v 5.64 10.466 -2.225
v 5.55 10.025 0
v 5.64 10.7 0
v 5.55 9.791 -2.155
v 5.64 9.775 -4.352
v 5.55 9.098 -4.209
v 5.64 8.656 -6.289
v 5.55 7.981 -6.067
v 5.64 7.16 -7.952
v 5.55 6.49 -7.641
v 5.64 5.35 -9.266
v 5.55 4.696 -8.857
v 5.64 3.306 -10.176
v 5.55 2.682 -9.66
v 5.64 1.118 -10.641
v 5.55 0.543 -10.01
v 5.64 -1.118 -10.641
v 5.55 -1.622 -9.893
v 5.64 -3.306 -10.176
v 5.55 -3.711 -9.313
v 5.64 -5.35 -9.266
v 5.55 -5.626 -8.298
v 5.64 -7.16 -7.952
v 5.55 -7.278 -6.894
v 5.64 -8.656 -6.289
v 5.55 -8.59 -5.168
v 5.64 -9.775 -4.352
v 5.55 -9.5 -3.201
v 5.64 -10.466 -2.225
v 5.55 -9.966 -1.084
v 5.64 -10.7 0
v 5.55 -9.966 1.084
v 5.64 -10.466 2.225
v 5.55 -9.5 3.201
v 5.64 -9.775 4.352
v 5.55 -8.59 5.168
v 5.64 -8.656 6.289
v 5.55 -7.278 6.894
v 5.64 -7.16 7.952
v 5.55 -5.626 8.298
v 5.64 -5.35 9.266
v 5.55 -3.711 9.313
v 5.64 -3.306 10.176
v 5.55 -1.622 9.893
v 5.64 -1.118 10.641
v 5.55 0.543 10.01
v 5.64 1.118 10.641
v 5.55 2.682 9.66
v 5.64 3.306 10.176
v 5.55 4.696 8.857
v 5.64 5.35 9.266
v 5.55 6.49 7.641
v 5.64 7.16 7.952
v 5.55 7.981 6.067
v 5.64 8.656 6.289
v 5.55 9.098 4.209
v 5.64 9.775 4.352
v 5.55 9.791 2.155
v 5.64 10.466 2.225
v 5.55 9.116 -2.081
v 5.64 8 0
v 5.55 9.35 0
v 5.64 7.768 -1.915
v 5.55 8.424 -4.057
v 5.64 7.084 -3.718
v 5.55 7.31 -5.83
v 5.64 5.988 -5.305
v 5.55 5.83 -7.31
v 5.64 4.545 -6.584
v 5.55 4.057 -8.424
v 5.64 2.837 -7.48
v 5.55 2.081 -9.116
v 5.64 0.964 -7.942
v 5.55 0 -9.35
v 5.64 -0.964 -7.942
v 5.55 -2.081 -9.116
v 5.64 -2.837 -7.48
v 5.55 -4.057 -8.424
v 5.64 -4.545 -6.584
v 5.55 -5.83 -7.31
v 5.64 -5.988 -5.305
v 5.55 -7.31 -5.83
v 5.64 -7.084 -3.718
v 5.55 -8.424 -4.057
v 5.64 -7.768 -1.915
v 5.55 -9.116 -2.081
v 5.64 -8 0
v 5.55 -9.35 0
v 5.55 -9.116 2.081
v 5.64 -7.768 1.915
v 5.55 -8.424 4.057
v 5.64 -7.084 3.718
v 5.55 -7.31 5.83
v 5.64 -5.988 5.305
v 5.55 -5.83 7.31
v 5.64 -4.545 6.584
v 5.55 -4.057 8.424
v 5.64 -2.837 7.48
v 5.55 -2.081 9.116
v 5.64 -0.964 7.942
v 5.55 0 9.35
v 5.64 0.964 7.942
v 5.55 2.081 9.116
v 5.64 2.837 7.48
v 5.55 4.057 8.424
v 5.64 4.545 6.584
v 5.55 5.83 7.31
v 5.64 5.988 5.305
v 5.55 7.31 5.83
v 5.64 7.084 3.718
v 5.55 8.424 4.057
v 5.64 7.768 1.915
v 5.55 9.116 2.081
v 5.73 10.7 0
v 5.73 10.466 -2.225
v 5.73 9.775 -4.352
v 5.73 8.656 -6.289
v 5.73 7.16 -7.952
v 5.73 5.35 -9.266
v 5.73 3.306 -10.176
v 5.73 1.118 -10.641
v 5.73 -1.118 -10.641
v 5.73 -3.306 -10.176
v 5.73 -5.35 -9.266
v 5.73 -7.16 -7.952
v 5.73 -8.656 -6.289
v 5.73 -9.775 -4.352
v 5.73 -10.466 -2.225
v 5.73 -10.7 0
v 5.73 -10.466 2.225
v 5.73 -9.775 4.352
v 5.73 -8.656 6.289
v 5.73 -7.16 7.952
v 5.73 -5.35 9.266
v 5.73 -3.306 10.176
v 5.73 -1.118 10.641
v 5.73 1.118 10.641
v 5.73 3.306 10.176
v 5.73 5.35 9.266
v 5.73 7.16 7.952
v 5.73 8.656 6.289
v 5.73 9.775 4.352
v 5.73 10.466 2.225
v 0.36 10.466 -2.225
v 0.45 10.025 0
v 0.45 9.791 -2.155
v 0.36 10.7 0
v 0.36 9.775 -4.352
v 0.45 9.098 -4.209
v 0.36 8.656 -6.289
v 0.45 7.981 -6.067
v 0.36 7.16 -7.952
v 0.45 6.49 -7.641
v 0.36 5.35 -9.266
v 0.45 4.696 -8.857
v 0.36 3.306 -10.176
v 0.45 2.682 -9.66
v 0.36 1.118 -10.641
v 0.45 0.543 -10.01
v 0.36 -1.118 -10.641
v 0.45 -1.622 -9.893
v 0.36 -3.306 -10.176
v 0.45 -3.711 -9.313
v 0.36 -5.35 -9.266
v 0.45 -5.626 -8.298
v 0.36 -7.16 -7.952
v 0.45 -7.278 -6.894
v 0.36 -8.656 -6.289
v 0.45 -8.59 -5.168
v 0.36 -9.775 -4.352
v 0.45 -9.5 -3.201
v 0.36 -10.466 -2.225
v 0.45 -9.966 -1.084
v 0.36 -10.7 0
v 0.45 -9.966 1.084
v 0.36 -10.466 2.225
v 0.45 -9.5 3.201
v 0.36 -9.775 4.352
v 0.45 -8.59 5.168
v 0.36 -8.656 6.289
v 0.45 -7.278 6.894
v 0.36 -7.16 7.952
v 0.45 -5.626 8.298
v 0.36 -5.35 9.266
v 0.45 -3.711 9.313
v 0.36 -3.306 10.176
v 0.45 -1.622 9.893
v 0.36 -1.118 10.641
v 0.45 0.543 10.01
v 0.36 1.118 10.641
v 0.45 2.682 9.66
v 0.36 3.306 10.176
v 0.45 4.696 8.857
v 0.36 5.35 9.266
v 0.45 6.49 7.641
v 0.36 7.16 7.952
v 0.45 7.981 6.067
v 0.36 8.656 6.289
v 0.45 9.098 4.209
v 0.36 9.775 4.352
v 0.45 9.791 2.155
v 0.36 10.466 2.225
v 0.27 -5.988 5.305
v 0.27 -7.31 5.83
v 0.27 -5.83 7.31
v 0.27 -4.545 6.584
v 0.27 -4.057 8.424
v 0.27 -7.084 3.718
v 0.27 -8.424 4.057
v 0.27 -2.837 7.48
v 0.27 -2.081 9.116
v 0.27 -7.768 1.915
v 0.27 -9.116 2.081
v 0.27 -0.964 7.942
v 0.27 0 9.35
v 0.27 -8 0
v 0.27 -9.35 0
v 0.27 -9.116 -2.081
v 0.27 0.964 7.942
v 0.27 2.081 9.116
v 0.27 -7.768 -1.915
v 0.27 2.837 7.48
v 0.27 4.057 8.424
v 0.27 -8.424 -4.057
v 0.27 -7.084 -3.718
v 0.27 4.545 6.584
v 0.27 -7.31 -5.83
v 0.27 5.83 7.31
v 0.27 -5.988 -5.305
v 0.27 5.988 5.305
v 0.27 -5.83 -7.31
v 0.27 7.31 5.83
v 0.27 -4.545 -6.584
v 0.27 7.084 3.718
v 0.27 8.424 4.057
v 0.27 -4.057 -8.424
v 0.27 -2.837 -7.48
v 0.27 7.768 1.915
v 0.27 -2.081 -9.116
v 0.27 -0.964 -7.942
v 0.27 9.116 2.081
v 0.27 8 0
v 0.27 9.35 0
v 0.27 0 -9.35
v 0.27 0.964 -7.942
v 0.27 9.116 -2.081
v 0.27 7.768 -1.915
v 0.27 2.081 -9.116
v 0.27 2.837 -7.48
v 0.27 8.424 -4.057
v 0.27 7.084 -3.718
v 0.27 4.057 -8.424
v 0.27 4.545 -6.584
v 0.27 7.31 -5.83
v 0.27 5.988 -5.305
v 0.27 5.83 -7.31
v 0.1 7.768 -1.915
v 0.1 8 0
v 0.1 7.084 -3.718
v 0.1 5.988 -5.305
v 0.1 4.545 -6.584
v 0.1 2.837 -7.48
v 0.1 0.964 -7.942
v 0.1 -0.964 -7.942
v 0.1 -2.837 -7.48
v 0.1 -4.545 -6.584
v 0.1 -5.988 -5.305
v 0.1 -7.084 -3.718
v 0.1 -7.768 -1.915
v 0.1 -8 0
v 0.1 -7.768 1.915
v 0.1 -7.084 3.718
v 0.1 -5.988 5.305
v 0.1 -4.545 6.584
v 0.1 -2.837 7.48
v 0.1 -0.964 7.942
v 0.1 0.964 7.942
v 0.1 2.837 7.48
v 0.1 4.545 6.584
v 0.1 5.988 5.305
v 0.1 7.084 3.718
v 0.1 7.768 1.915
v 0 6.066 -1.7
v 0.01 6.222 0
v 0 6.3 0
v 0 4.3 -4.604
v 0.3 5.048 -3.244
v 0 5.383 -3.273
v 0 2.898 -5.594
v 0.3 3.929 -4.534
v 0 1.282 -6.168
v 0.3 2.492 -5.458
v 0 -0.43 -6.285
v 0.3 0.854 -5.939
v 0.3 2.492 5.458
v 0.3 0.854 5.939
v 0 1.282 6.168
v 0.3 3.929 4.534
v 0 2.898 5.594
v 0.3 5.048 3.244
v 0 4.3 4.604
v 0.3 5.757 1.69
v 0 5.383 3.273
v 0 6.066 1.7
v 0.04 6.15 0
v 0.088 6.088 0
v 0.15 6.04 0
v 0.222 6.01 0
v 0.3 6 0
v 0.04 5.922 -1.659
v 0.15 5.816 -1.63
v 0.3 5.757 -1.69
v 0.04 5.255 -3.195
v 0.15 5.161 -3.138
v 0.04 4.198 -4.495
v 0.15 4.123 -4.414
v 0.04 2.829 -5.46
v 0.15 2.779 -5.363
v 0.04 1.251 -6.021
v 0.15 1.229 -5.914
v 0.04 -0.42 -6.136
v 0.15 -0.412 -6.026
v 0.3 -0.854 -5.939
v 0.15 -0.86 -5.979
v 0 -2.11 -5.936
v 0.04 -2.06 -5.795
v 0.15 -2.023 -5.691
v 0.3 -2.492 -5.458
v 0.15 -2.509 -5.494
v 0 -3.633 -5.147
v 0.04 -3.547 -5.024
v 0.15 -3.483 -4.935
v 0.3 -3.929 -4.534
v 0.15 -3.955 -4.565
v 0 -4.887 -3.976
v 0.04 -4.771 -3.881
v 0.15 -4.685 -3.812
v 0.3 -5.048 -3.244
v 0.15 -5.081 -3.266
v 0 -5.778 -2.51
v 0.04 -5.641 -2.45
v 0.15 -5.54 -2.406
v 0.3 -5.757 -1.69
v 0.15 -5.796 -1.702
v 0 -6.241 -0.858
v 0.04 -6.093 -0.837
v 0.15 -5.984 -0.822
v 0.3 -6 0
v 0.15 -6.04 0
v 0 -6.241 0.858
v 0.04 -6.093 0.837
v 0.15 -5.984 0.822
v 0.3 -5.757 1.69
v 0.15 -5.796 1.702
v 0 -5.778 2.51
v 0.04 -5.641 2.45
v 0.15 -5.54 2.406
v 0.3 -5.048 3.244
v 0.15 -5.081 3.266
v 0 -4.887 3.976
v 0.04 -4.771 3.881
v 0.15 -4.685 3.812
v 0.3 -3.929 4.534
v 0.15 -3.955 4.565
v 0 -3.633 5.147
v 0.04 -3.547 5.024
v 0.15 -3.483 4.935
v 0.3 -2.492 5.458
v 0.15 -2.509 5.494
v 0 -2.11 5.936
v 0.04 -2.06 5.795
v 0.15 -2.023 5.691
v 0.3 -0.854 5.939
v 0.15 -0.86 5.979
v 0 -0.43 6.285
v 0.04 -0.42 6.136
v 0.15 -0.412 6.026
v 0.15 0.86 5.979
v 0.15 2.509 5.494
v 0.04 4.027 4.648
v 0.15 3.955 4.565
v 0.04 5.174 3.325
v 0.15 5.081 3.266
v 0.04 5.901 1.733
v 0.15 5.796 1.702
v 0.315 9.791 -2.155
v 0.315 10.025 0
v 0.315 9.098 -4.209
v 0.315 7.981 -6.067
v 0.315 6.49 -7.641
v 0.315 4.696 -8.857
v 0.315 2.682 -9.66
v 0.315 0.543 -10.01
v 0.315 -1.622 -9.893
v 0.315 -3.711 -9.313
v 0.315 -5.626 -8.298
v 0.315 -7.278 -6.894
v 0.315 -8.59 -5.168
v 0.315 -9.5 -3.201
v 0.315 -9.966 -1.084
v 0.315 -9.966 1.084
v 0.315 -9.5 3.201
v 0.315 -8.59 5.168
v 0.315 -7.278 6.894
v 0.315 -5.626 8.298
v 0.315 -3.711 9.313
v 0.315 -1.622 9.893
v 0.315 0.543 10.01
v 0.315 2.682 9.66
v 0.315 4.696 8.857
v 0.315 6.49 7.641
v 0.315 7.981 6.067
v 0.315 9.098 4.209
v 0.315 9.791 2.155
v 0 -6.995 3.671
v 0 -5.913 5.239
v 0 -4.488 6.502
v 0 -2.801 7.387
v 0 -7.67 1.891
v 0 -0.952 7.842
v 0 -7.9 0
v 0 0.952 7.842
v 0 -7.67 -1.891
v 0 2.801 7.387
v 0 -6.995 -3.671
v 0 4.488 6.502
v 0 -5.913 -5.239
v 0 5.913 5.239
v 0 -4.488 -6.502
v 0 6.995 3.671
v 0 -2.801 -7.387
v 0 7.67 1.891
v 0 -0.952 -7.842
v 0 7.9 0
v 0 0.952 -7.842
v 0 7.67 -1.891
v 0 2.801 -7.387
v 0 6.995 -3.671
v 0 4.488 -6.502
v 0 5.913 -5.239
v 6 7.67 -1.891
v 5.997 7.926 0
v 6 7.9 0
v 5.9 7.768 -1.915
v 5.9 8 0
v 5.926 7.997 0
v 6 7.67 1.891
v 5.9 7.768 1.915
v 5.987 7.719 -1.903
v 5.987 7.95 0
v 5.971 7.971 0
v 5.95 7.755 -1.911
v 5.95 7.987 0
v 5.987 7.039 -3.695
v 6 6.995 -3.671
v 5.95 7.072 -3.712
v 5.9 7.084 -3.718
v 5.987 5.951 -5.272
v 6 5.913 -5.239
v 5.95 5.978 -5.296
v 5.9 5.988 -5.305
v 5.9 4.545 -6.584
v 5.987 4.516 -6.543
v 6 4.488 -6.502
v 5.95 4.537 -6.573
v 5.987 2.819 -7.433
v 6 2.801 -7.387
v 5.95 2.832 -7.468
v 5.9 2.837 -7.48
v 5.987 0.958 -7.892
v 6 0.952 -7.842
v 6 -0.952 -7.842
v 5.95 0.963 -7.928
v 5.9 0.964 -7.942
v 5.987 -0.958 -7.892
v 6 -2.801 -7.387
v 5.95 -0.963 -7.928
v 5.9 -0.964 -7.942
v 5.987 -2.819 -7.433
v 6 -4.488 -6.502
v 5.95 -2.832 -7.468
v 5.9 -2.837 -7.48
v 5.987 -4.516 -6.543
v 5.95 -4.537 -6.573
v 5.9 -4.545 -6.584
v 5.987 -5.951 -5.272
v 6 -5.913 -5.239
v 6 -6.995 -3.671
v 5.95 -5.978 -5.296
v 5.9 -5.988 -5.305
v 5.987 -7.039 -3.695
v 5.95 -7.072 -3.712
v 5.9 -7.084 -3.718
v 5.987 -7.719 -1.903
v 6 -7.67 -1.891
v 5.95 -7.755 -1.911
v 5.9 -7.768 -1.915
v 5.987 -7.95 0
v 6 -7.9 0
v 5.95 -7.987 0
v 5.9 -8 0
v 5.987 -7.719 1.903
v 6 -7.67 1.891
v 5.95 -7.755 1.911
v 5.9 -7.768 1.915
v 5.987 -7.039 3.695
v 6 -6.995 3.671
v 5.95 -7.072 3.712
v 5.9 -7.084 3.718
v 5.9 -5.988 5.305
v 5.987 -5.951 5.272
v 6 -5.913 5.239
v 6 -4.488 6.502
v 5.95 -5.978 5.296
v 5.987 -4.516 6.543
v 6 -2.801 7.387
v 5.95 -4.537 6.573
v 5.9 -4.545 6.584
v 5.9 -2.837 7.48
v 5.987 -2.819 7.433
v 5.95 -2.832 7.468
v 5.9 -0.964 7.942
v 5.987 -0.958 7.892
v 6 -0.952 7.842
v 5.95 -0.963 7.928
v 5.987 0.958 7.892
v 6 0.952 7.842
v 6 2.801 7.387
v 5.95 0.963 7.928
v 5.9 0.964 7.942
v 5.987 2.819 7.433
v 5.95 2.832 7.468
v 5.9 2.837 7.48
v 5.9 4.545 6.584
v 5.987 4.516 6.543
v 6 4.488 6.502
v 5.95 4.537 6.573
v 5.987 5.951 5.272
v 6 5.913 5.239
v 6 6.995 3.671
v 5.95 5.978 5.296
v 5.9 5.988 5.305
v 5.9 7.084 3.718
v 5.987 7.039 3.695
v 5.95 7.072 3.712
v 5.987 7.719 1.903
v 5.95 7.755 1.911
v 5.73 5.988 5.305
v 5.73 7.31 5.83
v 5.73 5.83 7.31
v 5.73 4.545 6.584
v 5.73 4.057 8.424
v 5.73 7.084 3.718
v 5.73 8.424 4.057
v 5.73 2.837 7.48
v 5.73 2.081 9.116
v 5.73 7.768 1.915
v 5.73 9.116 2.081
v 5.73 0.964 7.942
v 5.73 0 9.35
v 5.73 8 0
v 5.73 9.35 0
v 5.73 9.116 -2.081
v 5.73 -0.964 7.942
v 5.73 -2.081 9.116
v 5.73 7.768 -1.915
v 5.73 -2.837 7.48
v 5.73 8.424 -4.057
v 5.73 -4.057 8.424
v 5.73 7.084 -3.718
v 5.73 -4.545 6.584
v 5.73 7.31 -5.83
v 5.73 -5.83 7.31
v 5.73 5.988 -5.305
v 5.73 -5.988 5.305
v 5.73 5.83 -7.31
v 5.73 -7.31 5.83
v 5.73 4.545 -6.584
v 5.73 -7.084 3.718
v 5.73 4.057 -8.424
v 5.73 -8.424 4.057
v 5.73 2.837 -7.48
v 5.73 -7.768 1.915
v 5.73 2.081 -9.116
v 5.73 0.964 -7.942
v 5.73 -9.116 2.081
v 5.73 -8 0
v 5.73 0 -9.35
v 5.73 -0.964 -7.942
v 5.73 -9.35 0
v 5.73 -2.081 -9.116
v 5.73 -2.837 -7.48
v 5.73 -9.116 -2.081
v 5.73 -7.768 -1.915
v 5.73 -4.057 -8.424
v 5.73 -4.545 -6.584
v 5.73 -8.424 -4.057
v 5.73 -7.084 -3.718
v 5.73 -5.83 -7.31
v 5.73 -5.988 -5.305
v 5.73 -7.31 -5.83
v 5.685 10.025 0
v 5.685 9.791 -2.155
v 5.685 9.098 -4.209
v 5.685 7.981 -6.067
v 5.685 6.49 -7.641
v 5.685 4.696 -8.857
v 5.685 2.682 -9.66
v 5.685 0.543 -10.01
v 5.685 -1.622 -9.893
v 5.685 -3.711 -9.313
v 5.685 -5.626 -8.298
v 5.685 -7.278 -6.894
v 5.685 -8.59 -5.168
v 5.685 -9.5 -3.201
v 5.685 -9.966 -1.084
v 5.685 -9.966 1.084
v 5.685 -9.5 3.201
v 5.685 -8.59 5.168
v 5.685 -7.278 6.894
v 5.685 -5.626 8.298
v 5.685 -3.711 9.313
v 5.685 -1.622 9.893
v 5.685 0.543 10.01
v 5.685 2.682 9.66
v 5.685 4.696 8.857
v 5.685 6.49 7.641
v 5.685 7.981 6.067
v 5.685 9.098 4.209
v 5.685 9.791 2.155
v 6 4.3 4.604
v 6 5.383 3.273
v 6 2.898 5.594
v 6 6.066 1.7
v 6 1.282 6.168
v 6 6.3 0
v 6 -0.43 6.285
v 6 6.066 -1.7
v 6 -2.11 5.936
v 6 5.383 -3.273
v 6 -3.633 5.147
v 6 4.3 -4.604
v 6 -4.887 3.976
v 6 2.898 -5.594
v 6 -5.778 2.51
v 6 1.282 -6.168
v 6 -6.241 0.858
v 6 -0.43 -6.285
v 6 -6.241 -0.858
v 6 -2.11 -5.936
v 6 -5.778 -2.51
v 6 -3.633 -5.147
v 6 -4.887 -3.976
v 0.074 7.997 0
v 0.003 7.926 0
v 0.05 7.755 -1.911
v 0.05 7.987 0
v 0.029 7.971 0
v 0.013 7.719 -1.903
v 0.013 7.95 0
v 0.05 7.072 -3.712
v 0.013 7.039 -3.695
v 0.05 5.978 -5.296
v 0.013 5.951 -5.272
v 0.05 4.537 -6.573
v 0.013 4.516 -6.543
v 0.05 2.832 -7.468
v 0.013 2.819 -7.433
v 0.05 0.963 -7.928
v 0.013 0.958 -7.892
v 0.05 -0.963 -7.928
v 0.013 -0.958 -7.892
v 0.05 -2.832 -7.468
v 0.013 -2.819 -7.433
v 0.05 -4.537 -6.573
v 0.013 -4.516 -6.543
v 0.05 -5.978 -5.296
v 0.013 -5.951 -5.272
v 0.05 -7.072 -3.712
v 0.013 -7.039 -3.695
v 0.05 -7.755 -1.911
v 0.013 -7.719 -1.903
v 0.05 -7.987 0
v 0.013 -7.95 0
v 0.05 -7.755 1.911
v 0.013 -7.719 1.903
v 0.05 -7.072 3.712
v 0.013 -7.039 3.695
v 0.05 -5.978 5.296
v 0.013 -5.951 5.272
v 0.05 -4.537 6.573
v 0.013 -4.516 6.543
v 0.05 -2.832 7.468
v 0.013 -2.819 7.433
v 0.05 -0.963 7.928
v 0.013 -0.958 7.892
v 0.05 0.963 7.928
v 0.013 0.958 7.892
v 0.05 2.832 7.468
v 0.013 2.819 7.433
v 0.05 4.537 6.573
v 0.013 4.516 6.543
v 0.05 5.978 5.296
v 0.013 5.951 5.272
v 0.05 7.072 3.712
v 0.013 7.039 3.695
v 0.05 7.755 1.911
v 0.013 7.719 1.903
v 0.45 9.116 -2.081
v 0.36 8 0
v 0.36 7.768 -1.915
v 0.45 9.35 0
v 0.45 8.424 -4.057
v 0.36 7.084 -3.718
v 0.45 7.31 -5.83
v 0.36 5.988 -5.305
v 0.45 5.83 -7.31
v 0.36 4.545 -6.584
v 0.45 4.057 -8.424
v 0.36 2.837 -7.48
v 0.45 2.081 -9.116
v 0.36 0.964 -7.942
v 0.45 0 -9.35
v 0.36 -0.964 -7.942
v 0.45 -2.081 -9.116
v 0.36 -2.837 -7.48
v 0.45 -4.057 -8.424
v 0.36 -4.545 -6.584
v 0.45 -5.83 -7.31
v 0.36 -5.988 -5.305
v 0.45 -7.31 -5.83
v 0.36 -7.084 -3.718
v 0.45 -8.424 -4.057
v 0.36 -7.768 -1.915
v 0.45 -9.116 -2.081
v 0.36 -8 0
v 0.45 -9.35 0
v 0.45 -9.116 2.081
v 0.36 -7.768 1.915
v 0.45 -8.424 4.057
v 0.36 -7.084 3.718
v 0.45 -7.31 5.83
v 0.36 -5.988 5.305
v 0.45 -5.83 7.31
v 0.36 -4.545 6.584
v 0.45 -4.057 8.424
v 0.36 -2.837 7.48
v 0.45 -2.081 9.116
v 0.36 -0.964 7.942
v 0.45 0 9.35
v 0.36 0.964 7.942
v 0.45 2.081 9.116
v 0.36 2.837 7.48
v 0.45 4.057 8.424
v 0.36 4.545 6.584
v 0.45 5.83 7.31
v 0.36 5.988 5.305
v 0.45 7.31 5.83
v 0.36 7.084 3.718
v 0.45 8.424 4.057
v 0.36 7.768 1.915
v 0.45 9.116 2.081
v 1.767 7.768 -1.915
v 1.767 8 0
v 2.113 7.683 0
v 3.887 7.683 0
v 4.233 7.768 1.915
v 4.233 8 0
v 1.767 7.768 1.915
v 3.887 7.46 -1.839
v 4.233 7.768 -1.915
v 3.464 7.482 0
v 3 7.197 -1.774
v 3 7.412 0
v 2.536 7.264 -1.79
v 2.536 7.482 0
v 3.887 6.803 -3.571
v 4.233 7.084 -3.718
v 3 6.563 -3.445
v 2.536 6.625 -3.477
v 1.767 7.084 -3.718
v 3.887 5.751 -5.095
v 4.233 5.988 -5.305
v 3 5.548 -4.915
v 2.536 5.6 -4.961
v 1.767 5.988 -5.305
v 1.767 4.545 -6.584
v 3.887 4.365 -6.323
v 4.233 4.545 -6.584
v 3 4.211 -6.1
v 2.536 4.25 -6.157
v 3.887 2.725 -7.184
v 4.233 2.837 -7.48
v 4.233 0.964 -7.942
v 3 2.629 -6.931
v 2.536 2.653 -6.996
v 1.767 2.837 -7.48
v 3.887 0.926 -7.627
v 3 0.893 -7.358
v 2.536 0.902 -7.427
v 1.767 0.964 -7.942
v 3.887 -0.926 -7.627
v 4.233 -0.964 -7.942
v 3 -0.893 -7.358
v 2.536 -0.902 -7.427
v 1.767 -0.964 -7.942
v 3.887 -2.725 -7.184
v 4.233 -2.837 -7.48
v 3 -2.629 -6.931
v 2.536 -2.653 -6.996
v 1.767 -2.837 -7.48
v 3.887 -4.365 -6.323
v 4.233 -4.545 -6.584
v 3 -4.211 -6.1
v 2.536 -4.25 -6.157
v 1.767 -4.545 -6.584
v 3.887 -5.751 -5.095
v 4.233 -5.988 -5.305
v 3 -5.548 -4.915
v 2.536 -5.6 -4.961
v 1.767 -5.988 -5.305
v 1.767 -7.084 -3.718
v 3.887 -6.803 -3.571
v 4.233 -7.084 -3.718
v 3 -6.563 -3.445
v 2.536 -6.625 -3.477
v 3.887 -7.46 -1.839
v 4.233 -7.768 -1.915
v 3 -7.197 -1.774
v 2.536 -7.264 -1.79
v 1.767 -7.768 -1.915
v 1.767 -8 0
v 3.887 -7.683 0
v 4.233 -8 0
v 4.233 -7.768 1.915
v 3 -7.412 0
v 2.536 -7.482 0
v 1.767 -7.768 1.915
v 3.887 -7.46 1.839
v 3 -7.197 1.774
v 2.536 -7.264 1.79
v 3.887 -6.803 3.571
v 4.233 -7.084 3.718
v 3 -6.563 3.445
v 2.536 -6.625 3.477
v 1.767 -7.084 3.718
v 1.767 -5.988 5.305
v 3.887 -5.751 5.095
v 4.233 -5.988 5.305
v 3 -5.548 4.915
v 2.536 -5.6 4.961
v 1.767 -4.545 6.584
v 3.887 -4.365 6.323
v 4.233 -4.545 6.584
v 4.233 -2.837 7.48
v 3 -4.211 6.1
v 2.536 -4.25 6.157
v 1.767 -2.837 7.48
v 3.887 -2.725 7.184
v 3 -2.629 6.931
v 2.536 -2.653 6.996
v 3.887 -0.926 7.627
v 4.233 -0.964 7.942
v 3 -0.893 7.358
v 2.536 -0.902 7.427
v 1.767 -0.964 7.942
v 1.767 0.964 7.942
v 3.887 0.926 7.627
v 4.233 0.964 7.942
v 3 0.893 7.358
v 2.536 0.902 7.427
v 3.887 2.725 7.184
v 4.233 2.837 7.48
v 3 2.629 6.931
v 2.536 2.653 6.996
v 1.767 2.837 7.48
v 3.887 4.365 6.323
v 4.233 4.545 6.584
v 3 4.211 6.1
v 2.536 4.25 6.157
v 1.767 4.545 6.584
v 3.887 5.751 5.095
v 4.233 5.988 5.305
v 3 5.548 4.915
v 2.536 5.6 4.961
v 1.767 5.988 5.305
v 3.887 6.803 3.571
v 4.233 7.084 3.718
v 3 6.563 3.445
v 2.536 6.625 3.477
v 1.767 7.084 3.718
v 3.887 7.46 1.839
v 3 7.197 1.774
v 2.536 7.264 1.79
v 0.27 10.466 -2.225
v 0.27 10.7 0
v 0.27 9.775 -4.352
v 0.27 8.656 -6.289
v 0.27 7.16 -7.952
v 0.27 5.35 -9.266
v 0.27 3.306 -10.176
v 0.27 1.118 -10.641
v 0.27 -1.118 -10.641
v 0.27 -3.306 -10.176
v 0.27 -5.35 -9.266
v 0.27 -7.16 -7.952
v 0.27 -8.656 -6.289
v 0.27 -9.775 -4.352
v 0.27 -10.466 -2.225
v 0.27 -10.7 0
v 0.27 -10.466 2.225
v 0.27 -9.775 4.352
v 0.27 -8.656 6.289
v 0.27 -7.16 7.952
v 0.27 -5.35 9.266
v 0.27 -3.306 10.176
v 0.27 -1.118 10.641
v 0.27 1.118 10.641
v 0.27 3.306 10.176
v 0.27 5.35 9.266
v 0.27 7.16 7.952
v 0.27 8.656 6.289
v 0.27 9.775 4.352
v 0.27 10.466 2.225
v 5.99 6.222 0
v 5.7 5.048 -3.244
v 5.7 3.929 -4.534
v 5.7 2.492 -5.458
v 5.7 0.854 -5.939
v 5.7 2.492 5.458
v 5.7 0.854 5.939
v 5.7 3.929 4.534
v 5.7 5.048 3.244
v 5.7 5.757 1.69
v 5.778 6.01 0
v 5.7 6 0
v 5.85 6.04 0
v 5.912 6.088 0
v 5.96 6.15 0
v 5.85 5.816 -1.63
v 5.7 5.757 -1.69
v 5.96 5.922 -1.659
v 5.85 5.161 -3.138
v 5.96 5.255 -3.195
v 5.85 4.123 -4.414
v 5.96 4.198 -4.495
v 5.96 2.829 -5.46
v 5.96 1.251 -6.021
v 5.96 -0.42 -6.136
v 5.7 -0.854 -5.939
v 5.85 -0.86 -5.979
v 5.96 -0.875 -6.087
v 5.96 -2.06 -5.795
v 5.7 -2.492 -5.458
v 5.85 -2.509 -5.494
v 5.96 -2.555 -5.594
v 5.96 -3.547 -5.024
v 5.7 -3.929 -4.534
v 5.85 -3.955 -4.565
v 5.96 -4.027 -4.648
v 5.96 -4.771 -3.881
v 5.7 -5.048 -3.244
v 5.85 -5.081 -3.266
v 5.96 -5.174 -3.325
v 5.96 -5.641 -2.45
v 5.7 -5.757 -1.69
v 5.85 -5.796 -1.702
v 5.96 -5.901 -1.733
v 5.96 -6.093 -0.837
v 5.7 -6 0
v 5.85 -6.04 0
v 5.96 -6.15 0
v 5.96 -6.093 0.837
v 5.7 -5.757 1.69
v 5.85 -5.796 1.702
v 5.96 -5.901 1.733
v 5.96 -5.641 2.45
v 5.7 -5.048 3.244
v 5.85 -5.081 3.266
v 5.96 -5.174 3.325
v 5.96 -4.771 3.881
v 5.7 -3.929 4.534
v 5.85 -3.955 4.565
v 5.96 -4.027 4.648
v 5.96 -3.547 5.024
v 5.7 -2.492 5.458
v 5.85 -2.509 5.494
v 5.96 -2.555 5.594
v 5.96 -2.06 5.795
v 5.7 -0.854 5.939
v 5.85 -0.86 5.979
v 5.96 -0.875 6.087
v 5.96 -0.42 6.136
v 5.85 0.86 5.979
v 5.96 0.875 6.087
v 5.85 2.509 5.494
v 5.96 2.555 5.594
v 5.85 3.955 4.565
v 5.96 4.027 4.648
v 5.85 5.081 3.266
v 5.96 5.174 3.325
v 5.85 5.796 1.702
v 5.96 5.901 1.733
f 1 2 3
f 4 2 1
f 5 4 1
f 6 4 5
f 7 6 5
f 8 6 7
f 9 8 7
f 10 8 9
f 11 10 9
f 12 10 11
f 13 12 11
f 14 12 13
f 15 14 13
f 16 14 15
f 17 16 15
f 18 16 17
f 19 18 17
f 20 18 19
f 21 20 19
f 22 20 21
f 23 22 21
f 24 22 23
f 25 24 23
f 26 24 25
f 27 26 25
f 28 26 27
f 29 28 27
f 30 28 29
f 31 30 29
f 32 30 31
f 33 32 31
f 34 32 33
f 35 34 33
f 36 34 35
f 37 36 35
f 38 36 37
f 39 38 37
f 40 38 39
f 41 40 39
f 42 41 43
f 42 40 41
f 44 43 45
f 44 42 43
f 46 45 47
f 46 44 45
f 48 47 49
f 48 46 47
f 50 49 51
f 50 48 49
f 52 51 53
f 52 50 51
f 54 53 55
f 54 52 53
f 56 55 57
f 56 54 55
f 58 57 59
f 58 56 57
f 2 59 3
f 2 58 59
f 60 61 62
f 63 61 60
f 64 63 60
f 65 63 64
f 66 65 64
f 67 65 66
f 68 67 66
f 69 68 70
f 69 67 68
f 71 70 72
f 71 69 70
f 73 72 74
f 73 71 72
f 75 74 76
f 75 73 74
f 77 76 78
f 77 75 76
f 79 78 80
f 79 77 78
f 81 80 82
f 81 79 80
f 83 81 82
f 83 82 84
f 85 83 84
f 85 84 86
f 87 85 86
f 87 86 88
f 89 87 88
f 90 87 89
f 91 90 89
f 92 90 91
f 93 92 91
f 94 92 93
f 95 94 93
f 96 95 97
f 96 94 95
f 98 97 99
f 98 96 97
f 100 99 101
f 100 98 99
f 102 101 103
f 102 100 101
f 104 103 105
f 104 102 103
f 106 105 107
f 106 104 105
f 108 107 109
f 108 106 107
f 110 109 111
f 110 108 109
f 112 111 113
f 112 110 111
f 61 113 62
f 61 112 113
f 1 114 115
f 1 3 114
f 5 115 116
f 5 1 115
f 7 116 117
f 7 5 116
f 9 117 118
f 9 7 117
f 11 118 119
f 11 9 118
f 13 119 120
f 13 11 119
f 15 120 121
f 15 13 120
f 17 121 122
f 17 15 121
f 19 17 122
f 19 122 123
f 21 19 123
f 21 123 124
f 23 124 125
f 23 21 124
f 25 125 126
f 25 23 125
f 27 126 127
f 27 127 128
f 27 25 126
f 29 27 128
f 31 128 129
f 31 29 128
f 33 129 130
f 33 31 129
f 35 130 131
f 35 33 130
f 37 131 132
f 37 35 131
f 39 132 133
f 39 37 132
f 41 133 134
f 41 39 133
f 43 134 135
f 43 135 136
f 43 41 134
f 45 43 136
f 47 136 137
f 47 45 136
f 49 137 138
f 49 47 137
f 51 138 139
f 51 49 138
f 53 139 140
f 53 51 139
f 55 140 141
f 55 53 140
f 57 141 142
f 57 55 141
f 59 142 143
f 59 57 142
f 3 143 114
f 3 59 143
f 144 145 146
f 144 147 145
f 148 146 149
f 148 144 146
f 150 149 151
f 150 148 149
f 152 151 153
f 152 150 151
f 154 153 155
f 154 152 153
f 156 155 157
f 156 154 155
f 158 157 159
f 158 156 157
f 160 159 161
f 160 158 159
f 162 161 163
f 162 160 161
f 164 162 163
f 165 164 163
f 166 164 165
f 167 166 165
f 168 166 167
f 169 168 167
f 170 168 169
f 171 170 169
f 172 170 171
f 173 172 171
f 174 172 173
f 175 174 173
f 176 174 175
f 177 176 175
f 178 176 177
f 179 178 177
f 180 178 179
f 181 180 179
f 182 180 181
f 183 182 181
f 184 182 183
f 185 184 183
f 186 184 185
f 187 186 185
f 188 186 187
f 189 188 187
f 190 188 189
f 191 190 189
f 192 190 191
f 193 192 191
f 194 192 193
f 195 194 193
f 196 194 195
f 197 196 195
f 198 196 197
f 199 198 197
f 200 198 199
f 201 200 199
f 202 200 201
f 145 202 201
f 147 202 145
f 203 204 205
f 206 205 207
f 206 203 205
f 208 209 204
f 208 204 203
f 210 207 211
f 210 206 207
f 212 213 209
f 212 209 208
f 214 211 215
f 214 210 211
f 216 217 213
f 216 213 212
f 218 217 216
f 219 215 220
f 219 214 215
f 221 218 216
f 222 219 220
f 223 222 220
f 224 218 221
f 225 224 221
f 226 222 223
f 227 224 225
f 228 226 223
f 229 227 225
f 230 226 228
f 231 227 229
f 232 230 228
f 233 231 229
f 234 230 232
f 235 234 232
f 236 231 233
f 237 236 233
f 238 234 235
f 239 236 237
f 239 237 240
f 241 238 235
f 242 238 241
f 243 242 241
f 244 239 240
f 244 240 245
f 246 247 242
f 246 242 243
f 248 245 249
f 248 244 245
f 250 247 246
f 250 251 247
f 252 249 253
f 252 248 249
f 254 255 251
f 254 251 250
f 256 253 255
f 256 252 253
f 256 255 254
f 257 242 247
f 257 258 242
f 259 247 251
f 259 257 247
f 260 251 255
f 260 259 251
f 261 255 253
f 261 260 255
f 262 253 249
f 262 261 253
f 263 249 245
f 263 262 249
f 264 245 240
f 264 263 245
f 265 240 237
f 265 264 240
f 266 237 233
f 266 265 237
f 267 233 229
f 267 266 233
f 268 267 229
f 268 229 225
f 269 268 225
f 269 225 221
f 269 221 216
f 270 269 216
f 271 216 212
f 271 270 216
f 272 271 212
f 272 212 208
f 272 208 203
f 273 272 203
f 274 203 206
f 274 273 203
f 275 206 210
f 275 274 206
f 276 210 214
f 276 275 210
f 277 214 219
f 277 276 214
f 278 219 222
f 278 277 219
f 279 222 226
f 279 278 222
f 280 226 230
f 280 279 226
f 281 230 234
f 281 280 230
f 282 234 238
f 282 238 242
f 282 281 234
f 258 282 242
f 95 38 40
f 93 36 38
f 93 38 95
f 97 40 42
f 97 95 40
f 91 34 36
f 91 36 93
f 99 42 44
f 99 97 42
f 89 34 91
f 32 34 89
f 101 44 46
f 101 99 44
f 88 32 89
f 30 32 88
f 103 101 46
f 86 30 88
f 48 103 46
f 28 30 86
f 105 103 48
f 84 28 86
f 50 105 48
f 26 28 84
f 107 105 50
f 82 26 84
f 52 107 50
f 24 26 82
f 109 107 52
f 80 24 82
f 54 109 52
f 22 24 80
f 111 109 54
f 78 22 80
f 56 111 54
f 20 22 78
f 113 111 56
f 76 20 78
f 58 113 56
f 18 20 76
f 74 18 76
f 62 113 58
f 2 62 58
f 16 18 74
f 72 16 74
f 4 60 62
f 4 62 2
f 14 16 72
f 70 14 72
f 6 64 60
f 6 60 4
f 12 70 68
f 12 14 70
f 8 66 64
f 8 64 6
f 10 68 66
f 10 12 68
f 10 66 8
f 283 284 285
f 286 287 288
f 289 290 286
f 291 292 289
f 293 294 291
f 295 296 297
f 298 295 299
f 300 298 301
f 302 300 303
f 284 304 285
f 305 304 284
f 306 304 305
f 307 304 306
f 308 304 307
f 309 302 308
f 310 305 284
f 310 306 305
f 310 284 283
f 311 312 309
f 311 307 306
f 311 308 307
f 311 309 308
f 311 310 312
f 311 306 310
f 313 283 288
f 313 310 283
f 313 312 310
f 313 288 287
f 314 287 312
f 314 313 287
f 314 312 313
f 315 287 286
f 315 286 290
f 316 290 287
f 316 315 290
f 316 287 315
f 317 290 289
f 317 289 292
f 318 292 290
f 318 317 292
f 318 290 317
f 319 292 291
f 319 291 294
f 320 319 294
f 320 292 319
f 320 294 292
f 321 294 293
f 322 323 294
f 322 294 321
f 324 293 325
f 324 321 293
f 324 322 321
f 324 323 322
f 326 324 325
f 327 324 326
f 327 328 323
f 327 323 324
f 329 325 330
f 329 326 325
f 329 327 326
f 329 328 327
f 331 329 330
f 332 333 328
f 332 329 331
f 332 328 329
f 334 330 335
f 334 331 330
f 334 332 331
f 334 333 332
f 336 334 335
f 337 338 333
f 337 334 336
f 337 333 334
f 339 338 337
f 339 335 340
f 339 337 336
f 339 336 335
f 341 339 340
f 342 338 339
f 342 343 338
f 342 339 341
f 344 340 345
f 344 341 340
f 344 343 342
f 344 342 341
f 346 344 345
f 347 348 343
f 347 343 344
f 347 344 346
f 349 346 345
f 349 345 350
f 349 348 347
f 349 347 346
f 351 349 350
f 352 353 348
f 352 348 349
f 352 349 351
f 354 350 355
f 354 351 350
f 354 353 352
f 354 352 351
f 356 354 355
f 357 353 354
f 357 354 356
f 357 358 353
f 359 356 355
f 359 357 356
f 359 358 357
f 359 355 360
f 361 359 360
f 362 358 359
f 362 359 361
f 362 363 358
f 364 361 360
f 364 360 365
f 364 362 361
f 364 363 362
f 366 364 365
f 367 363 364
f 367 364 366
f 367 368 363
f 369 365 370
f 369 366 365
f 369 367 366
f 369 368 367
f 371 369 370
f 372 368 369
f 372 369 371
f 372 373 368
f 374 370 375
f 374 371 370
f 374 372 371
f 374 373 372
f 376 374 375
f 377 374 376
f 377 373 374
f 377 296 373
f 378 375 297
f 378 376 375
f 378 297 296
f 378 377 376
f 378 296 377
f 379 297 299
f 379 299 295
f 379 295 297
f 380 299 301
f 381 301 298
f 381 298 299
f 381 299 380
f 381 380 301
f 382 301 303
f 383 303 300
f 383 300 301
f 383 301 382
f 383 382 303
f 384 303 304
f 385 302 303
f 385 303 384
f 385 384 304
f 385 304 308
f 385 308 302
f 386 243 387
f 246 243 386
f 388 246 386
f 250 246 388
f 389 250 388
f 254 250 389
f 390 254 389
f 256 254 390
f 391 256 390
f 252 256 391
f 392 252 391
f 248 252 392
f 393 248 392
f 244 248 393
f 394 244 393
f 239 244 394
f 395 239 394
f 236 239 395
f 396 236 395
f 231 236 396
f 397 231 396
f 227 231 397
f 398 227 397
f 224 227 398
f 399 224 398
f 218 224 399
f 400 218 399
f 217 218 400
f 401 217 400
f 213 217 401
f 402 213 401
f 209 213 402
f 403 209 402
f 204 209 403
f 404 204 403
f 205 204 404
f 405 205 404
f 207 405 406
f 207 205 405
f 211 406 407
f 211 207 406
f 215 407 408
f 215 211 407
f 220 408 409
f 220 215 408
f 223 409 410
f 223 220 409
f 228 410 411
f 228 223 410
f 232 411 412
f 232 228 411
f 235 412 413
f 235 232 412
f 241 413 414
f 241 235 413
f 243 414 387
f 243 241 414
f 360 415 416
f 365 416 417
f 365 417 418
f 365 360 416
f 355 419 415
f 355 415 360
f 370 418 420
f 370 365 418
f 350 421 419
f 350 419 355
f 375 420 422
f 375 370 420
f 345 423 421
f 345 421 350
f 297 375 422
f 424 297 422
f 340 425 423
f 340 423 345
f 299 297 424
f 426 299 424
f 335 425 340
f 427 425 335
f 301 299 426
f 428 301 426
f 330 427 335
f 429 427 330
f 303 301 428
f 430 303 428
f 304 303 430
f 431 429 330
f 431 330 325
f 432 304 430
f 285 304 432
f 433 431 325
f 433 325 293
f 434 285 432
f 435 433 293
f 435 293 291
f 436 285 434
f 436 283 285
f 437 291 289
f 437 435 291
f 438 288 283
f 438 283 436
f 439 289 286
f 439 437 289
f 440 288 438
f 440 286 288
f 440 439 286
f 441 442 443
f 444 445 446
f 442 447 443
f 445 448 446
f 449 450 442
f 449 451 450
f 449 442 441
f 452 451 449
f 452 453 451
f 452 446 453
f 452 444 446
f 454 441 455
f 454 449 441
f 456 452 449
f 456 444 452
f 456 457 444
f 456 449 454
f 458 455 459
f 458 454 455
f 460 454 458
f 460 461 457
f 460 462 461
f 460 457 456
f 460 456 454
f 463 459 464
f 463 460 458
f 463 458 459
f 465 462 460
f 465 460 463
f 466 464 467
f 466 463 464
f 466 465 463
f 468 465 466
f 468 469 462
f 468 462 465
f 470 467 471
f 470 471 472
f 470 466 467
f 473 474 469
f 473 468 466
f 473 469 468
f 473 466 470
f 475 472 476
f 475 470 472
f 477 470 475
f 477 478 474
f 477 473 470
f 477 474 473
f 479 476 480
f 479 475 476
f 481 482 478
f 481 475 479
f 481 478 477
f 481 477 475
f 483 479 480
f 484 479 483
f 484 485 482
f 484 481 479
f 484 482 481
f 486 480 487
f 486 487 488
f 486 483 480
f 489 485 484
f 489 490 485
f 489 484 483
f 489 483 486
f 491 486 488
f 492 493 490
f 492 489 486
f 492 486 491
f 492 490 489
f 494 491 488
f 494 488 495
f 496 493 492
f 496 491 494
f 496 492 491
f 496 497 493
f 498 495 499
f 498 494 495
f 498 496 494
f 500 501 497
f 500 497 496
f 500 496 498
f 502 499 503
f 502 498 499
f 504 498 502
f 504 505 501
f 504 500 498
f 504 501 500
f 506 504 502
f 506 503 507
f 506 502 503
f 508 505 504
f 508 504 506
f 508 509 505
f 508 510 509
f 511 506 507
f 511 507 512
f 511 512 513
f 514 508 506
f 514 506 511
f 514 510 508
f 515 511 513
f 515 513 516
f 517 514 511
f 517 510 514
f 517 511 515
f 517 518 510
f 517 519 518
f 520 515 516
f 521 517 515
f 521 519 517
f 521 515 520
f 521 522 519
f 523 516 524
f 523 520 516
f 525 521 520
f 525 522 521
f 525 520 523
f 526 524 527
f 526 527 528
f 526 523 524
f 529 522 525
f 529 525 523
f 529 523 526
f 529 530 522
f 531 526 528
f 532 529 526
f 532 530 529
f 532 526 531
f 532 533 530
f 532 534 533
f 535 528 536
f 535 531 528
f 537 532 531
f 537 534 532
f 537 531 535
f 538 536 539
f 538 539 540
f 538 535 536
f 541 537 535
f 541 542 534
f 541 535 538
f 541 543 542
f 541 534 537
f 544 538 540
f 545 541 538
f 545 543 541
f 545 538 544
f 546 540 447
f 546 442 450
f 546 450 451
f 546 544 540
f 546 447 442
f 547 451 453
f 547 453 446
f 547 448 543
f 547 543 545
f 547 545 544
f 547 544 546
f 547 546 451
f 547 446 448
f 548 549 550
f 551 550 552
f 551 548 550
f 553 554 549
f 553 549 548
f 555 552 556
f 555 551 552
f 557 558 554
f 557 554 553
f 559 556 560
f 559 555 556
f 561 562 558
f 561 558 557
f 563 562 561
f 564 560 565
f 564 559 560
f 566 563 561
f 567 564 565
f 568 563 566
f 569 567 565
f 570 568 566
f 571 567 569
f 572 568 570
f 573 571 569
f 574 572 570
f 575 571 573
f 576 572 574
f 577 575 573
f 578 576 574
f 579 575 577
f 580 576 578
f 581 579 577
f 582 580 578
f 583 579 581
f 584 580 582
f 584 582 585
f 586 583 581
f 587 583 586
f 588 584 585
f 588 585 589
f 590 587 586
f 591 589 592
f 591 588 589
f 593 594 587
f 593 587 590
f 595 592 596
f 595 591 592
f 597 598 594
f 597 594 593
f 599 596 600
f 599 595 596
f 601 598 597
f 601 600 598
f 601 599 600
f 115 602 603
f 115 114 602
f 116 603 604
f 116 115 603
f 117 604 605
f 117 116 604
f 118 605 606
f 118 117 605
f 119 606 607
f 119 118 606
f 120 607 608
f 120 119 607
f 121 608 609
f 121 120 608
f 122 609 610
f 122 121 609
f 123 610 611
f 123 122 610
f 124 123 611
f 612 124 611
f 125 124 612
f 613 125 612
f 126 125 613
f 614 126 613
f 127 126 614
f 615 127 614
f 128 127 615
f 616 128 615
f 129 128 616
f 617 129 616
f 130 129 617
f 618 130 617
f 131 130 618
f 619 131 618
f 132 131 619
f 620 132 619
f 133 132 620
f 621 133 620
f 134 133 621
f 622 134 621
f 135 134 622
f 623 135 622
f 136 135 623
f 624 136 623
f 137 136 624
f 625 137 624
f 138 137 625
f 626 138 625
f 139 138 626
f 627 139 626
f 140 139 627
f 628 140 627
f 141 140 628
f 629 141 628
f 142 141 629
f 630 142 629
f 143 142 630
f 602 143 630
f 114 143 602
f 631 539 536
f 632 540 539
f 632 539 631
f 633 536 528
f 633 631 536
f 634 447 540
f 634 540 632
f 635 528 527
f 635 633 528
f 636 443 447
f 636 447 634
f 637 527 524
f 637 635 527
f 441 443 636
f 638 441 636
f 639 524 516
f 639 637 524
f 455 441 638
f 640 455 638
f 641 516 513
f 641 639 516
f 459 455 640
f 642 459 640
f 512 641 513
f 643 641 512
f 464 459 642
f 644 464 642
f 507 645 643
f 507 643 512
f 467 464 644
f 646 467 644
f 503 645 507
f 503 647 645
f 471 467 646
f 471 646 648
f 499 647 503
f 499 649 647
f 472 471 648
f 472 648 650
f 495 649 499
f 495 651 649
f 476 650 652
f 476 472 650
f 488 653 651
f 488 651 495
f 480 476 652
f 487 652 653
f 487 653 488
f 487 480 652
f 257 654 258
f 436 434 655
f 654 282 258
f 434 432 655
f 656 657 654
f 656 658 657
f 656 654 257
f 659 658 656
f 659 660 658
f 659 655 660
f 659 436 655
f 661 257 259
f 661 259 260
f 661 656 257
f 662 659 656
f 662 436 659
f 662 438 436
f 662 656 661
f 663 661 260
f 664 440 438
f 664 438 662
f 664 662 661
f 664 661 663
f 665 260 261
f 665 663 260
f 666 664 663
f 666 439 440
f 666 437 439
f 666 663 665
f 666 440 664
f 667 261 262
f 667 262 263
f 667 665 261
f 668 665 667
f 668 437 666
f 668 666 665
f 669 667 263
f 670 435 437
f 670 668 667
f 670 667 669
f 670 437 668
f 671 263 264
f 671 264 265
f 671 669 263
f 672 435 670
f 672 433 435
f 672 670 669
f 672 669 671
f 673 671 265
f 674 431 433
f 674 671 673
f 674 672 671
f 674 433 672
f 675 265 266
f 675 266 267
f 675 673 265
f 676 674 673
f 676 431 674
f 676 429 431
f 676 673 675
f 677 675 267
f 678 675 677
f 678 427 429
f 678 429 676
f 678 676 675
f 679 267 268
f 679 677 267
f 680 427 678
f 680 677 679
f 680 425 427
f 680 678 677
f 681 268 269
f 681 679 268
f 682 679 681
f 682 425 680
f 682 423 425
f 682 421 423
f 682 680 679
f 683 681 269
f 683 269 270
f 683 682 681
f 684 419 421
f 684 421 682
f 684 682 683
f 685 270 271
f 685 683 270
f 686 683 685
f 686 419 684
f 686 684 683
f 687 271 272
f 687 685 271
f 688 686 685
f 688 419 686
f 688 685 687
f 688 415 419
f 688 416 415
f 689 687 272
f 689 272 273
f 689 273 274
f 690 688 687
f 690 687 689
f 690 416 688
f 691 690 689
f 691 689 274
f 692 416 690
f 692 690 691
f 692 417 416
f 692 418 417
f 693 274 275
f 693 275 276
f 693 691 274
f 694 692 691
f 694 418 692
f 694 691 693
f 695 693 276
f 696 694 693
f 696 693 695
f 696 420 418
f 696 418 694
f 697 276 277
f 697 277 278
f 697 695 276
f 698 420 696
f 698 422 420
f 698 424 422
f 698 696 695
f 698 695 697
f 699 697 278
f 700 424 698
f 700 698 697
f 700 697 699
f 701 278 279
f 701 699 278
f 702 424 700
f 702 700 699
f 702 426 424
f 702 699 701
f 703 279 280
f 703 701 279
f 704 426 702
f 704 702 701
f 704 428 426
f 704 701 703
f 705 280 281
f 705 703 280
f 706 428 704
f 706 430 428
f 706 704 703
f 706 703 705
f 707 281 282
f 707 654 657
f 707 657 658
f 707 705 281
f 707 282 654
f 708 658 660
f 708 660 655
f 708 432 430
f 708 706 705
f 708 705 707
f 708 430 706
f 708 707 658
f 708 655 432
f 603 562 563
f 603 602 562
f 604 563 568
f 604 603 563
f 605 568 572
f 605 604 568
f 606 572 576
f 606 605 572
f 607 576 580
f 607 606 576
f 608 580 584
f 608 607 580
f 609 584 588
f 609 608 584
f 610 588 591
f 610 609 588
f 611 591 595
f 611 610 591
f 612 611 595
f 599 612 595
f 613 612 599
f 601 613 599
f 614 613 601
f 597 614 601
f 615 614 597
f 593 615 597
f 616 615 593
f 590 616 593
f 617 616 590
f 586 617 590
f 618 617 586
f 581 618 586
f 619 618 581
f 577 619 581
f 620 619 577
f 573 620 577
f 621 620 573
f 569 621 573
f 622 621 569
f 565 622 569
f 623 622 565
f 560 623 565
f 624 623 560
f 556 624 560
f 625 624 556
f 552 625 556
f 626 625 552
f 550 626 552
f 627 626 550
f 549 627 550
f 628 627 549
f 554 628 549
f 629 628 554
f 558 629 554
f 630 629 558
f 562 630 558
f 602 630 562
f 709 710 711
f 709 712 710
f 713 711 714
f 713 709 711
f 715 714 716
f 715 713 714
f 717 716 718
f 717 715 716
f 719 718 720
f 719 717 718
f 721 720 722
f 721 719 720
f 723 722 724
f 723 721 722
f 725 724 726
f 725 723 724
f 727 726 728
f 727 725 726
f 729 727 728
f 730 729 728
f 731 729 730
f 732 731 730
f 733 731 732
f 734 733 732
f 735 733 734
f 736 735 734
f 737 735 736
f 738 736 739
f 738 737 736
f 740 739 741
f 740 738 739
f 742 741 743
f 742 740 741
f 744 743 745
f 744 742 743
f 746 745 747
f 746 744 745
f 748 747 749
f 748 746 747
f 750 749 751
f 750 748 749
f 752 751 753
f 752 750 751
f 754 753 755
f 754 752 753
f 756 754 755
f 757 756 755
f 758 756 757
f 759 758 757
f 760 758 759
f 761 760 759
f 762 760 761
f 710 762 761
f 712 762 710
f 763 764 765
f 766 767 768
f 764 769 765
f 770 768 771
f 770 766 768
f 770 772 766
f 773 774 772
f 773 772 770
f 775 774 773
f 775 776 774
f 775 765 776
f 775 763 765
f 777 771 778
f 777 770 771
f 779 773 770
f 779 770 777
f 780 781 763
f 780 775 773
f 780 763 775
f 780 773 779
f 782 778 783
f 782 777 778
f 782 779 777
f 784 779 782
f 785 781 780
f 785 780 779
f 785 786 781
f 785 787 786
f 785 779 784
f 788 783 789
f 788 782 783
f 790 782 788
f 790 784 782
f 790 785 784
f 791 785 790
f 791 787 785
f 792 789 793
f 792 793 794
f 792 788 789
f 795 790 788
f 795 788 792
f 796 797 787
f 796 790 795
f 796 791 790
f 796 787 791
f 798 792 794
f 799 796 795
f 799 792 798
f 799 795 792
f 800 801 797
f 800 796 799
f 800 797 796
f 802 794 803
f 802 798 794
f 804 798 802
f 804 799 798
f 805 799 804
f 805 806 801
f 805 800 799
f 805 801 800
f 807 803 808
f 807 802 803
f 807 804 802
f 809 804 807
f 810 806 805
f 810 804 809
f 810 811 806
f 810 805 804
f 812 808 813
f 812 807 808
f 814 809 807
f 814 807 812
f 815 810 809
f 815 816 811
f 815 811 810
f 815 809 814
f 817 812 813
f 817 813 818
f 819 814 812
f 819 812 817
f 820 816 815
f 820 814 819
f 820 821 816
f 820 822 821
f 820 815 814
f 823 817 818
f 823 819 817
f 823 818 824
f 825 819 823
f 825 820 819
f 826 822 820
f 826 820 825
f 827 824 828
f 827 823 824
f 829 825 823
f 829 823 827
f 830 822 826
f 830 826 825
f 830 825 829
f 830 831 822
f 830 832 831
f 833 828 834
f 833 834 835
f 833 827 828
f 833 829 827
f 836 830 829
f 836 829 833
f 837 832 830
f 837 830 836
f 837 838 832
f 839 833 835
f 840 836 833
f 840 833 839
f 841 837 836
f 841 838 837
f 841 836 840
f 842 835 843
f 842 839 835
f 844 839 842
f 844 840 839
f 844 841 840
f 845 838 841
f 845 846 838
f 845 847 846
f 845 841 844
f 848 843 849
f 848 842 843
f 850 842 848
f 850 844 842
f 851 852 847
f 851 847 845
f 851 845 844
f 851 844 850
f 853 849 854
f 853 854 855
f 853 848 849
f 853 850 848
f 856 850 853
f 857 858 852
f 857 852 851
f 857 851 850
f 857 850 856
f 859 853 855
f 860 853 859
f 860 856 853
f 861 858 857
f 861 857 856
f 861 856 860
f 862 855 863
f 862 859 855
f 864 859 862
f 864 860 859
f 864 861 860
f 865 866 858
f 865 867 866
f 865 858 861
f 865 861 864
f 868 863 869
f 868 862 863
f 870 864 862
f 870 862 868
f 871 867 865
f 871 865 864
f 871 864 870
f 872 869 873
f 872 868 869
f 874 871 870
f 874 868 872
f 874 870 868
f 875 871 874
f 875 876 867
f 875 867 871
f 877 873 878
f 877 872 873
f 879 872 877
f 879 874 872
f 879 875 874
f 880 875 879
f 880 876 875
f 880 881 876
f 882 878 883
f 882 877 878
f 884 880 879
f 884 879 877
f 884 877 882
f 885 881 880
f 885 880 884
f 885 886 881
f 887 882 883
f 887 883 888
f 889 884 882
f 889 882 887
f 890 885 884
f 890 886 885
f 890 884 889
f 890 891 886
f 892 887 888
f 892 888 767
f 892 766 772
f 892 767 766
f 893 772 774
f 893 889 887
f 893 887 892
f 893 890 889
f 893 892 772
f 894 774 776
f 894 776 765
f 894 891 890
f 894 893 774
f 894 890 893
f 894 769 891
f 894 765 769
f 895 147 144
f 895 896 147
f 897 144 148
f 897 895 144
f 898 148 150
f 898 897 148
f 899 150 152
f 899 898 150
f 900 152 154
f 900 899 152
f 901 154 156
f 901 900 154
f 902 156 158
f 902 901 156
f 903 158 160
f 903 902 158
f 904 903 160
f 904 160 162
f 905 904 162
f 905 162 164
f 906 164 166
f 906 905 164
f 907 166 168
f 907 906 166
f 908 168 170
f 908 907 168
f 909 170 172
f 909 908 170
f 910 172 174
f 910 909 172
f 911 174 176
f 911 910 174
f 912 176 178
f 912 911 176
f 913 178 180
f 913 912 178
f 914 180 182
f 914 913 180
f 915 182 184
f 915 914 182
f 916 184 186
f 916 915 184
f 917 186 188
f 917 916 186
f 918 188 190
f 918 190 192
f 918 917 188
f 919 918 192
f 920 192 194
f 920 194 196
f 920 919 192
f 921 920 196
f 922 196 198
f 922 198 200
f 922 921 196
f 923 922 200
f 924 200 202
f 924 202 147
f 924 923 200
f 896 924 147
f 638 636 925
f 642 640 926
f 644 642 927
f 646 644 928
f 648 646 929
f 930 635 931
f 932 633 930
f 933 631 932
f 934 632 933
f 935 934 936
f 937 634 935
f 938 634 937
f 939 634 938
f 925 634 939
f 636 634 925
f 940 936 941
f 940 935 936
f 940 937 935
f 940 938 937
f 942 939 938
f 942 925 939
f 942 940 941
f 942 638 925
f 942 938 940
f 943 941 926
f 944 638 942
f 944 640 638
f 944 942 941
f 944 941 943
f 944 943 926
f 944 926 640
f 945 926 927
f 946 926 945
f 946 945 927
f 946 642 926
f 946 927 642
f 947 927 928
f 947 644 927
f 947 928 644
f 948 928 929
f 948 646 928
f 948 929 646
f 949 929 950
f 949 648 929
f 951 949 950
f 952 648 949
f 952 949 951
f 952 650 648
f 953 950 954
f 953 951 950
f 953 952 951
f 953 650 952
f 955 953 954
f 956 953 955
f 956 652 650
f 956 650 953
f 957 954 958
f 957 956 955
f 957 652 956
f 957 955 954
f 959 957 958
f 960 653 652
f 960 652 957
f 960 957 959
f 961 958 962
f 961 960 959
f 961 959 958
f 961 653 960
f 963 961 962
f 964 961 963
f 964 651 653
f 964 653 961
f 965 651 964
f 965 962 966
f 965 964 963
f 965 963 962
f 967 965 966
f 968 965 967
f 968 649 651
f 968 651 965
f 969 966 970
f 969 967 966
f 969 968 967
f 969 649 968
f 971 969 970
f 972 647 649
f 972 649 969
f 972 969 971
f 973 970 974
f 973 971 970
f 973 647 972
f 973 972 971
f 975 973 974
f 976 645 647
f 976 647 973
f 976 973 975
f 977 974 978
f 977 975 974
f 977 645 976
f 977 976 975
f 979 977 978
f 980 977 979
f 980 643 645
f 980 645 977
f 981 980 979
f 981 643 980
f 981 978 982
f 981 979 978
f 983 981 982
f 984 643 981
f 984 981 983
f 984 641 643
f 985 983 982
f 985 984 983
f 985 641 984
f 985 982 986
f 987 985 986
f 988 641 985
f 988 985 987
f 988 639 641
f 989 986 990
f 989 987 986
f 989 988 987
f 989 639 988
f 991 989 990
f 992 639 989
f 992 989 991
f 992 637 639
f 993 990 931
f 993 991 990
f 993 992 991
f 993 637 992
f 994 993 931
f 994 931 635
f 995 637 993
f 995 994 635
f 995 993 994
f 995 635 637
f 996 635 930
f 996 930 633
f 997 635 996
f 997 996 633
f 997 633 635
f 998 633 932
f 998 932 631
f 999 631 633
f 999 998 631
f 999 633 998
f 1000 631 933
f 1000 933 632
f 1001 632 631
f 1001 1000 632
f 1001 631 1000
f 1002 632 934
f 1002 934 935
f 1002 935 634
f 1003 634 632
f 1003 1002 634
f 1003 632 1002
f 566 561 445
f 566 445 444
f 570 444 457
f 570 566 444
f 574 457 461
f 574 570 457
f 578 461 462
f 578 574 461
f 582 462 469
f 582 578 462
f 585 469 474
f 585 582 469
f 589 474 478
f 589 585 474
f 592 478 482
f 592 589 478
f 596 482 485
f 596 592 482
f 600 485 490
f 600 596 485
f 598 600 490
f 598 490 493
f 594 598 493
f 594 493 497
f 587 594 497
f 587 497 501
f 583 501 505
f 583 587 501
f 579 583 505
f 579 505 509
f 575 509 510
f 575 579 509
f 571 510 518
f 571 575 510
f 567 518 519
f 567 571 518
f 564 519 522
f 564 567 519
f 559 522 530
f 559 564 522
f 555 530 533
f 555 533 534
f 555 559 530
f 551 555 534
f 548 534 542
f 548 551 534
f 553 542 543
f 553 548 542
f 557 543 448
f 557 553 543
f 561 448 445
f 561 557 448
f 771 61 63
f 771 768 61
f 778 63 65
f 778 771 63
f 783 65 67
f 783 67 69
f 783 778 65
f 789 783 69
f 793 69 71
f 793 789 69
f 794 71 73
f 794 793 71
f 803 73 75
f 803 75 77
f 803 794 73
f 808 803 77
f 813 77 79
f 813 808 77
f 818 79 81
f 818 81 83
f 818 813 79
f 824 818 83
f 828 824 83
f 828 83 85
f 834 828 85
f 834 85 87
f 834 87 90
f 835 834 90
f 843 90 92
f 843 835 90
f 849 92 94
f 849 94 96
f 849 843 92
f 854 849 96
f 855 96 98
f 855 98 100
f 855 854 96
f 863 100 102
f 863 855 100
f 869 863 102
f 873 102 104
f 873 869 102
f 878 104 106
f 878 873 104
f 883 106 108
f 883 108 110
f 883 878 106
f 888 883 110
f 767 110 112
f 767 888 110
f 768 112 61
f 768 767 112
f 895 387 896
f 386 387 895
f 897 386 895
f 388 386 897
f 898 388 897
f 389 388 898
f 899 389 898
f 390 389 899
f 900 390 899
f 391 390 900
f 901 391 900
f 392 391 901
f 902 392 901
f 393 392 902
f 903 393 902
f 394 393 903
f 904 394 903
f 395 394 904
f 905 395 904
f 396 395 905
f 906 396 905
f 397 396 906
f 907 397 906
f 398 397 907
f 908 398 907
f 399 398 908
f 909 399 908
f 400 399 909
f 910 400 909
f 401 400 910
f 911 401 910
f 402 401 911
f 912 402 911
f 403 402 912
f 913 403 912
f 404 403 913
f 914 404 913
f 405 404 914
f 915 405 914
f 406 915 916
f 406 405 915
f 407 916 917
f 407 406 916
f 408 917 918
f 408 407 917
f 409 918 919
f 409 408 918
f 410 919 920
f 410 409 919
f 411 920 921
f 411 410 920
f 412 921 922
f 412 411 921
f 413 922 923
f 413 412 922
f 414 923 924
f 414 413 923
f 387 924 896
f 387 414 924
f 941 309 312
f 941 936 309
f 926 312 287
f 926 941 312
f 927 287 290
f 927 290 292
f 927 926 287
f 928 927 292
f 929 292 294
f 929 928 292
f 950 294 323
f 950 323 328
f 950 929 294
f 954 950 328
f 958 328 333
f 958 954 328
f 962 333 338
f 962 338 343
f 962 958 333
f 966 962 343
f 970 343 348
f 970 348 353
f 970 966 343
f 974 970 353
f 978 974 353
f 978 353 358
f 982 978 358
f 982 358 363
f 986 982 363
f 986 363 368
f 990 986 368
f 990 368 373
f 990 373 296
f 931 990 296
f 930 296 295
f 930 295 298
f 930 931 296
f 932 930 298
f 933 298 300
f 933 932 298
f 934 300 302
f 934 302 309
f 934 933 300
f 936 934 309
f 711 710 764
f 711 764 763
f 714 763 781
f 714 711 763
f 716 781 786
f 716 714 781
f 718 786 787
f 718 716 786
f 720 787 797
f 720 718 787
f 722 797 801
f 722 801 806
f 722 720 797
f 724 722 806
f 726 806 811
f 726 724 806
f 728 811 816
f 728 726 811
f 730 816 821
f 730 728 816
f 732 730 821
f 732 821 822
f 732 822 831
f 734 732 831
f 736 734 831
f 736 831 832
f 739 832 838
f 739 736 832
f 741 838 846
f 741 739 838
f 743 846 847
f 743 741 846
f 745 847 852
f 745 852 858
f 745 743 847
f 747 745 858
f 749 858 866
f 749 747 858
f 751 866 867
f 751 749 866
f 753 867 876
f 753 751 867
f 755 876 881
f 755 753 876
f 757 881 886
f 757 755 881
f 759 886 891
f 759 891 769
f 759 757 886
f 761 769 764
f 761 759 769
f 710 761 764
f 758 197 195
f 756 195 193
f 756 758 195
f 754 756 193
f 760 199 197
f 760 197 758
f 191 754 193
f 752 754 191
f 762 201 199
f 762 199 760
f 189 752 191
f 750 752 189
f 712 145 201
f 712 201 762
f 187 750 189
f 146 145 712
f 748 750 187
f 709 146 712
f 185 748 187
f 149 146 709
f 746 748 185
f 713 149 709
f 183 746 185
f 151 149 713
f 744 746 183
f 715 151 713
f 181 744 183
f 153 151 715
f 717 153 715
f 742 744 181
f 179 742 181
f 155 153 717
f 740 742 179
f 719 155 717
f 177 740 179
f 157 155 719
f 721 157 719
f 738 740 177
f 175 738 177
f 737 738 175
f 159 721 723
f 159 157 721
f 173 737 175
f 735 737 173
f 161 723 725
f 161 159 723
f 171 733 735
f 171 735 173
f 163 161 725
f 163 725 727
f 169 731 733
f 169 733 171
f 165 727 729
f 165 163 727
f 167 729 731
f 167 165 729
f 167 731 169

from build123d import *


with BuildPart() as part:
    # Sketch1 → Revolve1 (revolve)
    with BuildSketch(Plane.XY):
        with BuildLine():
            Line((0, 7.9), (0, 6.3))
            ThreePointArc((0, 6.3), (0.087867966, 6.087867966), (0.3, 6))
            Line((0.3, 6), (5.7, 6))
            ThreePointArc((5.7, 6), (5.912132034, 6.087867966), (6, 6.3))
            Line((6, 6.3), (6, 7.9))
            ThreePointArc((6, 7.9), (5.970710678, 7.970710678), (5.9, 8))
            Line((5.9, 8), (4.232946167, 8))
            ThreePointArc((4.232946167, 8), (3, 7.4125), (1.767053833, 8))
            Line((1.767053833, 8), (0.1, 8))
            ThreePointArc((0.1, 8), (0.029289322, 7.970710678), (0, 7.9))
        make_face()
    revolve(axis=Axis((50, 0, 0), (-1, 0, 0)))

    # Sketch2 → Revolve2 (revolve)
    with BuildSketch(Plane.XY):
        Polygon((0.27, 10.7), (0.315, 10.025), (0.27, 9.35), (0.27, 8), (0.36, 8), (0.45, 9.35), (0.45, 10.025), (0.36, 10.7), align=None)
    revolve(axis=Axis((50, 0, 0), (-1, 0, 0)))

    # Sketch3 → Revolve3 (revolve)
    with BuildSketch(Plane.XY):
        Polygon((5.55, 10.025), (5.55, 9.35), (5.64, 8), (5.73, 8), (5.73, 9.35), (5.685, 10.025), (5.73, 10.7), (5.64, 10.7), align=None)
    revolve(axis=Axis((50, 0, 0), (-1, 0, 0)))


solid = part.part
